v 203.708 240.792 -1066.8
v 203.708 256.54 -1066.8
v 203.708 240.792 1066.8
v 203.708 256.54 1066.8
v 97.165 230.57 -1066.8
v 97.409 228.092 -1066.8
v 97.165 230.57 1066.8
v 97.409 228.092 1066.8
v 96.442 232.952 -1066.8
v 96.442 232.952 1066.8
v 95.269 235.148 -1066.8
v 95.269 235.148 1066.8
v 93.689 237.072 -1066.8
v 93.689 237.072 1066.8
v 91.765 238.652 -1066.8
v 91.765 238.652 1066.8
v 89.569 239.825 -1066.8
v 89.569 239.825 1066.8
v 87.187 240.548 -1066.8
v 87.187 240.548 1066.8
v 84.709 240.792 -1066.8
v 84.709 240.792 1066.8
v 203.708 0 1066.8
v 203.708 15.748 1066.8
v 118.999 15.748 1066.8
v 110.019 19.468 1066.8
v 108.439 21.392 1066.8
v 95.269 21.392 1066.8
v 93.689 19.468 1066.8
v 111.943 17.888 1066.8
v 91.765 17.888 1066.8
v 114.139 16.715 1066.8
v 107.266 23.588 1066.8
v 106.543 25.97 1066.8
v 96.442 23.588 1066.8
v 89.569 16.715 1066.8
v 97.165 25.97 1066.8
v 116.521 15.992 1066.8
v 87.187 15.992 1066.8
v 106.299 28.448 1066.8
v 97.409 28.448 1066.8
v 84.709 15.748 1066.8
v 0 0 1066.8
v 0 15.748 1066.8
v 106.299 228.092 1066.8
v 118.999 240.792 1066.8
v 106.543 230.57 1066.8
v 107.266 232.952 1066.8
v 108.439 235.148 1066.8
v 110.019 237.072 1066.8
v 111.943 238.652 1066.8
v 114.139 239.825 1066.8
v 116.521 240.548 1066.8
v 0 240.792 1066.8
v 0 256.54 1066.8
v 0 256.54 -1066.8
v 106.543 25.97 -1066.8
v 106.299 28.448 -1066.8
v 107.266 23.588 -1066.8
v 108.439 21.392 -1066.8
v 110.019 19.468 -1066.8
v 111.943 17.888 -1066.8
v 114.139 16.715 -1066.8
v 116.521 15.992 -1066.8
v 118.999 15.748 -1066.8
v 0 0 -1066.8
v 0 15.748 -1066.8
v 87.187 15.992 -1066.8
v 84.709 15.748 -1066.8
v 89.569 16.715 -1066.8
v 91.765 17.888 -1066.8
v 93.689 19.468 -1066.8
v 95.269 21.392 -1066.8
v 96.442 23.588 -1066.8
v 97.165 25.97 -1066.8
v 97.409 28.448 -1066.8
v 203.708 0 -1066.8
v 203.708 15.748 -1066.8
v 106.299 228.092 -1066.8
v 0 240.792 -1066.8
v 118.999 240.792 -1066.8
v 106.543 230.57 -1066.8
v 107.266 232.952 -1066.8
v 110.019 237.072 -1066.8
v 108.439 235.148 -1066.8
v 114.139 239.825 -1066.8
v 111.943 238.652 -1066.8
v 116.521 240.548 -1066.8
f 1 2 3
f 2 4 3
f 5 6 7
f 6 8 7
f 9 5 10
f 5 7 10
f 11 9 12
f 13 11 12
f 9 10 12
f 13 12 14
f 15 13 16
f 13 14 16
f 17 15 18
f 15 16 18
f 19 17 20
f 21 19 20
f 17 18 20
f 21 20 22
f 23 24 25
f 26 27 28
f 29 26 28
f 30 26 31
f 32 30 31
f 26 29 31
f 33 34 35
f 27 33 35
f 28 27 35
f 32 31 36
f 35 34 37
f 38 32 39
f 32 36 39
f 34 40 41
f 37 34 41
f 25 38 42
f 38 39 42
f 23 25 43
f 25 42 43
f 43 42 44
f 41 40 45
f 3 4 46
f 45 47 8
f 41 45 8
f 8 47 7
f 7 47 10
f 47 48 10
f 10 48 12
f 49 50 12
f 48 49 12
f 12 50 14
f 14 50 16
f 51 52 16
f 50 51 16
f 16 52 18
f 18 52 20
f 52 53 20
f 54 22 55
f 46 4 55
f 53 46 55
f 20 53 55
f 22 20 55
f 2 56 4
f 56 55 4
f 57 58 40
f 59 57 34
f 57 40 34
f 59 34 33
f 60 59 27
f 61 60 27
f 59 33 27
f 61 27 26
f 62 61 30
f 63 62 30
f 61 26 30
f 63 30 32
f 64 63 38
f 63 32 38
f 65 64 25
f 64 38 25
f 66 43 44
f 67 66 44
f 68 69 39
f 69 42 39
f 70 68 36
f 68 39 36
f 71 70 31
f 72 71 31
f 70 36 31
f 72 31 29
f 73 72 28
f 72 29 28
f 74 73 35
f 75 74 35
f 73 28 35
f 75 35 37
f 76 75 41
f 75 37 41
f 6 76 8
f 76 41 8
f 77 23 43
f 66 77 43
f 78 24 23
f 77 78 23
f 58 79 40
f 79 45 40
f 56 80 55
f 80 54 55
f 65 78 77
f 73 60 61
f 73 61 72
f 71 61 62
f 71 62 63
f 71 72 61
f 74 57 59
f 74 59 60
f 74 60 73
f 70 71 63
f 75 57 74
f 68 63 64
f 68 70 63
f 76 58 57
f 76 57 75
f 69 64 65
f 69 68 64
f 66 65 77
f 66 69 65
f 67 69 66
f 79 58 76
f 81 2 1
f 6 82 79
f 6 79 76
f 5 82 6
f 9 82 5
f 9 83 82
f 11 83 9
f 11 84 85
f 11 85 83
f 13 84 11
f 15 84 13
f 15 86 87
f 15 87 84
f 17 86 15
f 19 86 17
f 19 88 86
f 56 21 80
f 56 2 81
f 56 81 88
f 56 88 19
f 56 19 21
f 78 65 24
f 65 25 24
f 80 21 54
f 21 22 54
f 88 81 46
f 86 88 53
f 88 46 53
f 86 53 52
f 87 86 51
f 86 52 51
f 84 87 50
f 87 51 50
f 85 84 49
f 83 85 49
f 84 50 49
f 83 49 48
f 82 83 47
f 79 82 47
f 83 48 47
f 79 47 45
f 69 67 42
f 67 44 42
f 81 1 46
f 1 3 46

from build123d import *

# Parameters (mm, degrees)
BASESTEELW_DEPTH = 1066.8


with BuildPart() as part:
    # Sketch1 → BaseSteelW (new, symmetric)
    with BuildSketch(Plane.XY):
        with BuildLine():
            Line((0, 0), (0, 15.748))
            Line((0, 15.748), (84.709, 15.748))
            ThreePointArc((84.709, 15.748), (93.689256121, 19.467743879), (97.409, 28.448))
            Line((97.409, 28.448), (97.409, 228.092))
            ThreePointArc((97.409, 228.092), (93.689256121, 237.072256121), (84.709, 240.792))
            Line((84.709, 240.792), (0, 240.792))
            Line((0, 240.792), (0, 256.54))
            Line((0, 256.54), (203.708, 256.54))
            Line((203.708, 256.54), (203.708, 240.792))
            Line((203.708, 240.792), (118.999, 240.792))
            ThreePointArc((118.999, 240.792), (110.018743879, 237.072256121), (106.299, 228.092))
            Line((106.299, 228.092), (106.299, 28.448))
            ThreePointArc((106.299, 28.448), (110.018743879, 19.467743879), (118.999, 15.748))
            Line((118.999, 15.748), (203.708, 15.748))
            Line((203.708, 15.748), (203.708, 0))
            Line((203.708, 0), (0, 0))
        make_face()
    extrude(amount=BASESTEELW_DEPTH, both=True)


solid = part.part
